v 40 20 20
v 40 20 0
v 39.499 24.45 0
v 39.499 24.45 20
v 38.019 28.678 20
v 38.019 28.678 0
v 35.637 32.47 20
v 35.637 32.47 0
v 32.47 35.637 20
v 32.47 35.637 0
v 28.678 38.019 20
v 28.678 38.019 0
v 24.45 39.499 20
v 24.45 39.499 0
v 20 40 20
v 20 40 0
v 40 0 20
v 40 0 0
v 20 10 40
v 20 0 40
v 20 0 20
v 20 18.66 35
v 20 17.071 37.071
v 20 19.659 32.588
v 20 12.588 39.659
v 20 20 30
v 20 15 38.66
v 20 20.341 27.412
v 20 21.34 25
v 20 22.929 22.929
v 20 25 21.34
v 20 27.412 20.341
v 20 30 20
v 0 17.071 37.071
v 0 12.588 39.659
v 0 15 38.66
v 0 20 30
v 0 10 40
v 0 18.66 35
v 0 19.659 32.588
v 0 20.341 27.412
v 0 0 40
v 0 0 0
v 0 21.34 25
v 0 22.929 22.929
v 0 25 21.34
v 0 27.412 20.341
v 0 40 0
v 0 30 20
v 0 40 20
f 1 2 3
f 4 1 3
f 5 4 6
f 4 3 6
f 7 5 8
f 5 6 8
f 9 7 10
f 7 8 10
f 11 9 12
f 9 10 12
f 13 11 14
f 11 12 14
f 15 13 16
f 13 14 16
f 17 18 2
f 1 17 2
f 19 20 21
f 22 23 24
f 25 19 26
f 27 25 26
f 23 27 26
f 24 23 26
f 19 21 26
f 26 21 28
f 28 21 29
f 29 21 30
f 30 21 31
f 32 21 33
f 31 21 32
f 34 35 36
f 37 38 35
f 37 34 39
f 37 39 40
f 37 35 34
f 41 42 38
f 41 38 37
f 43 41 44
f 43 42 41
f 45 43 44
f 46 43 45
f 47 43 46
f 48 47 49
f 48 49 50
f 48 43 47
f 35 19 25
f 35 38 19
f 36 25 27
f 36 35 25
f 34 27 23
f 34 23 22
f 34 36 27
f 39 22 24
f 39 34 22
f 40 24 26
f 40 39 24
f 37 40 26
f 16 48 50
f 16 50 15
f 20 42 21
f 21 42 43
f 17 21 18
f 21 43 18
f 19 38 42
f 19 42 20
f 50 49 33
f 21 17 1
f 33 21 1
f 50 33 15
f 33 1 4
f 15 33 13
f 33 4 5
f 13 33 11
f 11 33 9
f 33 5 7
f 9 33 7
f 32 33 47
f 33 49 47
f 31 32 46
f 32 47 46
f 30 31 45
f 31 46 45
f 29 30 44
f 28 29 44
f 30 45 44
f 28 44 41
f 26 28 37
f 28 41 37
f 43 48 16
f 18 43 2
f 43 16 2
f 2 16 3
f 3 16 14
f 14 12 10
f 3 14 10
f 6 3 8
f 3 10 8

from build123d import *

# Parameters (mm, degrees)
DODANIE_WYCI_GNI_CIE1_DEPTH = 20
SZKIC2_W                    = 20
SZKIC2_H                    = 40
DODANIE_WYCI_GNI_CIE2_DEPTH = 20
WYTNIJ_WYCI_GNI_CIE1_DEPTH  = 20
ZAOKR_GLENIE1_R             = 10
ZAOKR_GLENIE2_R             = 10


with BuildPart() as part:
    # Szkic1 → Dodanie-wyciągnięcie1 (new body)
    with BuildSketch(Plane.XY):
        with BuildLine():
            Line((0, 0), (40, 0))
            Line((40, 0), (40, 20))
            ThreePointArc((40, 20), (34.142135624, 34.142135624), (20, 40))
            Line((20, 40), (0, 40))
            Line((0, 40), (0, 0))
        make_face()
    extrude(amount=DODANIE_WYCI_GNI_CIE1_DEPTH)

    # Szkic2 → Dodanie-wyciągnięcie2 (add)
    with BuildSketch(Plane.XY.offset(20)):
        with Locations((10, 20)):
            Rectangle(SZKIC2_W, SZKIC2_H)
    extrude(amount=DODANIE_WYCI_GNI_CIE2_DEPTH)

    # Szkic3 → Wytnij-wyciągnięcie1 (cut)
    with BuildSketch(Plane(origin=(20, 0, 0), x_dir=(0, 0, -1), z_dir=(1, 0, 0))):
        Polygon((-40, 20), (-30, 20), (-20, 20), (-20, 40), (-40, 40), align=None)
    extrude(amount=-WYTNIJ_WYCI_GNI_CIE1_DEPTH, mode=Mode.SUBTRACT)

    # Zaokrąglenie1
    zaokr_glenie1_edges = [part.edges().sort_by_distance(p)[0] for p in [
        (10, 20, 20),
    ]]
    fillet(zaokr_glenie1_edges, radius=ZAOKR_GLENIE1_R)

    # Zaokrąglenie2
    zaokr_glenie2_edges = [part.edges().sort_by_distance(p)[0] for p in [
        (10, 20, 40),
    ]]
    fillet(zaokr_glenie2_edges, radius=ZAOKR_GLENIE2_R - 0.0001)  # a hair under: the kernel refuses the full size


solid = part.part
